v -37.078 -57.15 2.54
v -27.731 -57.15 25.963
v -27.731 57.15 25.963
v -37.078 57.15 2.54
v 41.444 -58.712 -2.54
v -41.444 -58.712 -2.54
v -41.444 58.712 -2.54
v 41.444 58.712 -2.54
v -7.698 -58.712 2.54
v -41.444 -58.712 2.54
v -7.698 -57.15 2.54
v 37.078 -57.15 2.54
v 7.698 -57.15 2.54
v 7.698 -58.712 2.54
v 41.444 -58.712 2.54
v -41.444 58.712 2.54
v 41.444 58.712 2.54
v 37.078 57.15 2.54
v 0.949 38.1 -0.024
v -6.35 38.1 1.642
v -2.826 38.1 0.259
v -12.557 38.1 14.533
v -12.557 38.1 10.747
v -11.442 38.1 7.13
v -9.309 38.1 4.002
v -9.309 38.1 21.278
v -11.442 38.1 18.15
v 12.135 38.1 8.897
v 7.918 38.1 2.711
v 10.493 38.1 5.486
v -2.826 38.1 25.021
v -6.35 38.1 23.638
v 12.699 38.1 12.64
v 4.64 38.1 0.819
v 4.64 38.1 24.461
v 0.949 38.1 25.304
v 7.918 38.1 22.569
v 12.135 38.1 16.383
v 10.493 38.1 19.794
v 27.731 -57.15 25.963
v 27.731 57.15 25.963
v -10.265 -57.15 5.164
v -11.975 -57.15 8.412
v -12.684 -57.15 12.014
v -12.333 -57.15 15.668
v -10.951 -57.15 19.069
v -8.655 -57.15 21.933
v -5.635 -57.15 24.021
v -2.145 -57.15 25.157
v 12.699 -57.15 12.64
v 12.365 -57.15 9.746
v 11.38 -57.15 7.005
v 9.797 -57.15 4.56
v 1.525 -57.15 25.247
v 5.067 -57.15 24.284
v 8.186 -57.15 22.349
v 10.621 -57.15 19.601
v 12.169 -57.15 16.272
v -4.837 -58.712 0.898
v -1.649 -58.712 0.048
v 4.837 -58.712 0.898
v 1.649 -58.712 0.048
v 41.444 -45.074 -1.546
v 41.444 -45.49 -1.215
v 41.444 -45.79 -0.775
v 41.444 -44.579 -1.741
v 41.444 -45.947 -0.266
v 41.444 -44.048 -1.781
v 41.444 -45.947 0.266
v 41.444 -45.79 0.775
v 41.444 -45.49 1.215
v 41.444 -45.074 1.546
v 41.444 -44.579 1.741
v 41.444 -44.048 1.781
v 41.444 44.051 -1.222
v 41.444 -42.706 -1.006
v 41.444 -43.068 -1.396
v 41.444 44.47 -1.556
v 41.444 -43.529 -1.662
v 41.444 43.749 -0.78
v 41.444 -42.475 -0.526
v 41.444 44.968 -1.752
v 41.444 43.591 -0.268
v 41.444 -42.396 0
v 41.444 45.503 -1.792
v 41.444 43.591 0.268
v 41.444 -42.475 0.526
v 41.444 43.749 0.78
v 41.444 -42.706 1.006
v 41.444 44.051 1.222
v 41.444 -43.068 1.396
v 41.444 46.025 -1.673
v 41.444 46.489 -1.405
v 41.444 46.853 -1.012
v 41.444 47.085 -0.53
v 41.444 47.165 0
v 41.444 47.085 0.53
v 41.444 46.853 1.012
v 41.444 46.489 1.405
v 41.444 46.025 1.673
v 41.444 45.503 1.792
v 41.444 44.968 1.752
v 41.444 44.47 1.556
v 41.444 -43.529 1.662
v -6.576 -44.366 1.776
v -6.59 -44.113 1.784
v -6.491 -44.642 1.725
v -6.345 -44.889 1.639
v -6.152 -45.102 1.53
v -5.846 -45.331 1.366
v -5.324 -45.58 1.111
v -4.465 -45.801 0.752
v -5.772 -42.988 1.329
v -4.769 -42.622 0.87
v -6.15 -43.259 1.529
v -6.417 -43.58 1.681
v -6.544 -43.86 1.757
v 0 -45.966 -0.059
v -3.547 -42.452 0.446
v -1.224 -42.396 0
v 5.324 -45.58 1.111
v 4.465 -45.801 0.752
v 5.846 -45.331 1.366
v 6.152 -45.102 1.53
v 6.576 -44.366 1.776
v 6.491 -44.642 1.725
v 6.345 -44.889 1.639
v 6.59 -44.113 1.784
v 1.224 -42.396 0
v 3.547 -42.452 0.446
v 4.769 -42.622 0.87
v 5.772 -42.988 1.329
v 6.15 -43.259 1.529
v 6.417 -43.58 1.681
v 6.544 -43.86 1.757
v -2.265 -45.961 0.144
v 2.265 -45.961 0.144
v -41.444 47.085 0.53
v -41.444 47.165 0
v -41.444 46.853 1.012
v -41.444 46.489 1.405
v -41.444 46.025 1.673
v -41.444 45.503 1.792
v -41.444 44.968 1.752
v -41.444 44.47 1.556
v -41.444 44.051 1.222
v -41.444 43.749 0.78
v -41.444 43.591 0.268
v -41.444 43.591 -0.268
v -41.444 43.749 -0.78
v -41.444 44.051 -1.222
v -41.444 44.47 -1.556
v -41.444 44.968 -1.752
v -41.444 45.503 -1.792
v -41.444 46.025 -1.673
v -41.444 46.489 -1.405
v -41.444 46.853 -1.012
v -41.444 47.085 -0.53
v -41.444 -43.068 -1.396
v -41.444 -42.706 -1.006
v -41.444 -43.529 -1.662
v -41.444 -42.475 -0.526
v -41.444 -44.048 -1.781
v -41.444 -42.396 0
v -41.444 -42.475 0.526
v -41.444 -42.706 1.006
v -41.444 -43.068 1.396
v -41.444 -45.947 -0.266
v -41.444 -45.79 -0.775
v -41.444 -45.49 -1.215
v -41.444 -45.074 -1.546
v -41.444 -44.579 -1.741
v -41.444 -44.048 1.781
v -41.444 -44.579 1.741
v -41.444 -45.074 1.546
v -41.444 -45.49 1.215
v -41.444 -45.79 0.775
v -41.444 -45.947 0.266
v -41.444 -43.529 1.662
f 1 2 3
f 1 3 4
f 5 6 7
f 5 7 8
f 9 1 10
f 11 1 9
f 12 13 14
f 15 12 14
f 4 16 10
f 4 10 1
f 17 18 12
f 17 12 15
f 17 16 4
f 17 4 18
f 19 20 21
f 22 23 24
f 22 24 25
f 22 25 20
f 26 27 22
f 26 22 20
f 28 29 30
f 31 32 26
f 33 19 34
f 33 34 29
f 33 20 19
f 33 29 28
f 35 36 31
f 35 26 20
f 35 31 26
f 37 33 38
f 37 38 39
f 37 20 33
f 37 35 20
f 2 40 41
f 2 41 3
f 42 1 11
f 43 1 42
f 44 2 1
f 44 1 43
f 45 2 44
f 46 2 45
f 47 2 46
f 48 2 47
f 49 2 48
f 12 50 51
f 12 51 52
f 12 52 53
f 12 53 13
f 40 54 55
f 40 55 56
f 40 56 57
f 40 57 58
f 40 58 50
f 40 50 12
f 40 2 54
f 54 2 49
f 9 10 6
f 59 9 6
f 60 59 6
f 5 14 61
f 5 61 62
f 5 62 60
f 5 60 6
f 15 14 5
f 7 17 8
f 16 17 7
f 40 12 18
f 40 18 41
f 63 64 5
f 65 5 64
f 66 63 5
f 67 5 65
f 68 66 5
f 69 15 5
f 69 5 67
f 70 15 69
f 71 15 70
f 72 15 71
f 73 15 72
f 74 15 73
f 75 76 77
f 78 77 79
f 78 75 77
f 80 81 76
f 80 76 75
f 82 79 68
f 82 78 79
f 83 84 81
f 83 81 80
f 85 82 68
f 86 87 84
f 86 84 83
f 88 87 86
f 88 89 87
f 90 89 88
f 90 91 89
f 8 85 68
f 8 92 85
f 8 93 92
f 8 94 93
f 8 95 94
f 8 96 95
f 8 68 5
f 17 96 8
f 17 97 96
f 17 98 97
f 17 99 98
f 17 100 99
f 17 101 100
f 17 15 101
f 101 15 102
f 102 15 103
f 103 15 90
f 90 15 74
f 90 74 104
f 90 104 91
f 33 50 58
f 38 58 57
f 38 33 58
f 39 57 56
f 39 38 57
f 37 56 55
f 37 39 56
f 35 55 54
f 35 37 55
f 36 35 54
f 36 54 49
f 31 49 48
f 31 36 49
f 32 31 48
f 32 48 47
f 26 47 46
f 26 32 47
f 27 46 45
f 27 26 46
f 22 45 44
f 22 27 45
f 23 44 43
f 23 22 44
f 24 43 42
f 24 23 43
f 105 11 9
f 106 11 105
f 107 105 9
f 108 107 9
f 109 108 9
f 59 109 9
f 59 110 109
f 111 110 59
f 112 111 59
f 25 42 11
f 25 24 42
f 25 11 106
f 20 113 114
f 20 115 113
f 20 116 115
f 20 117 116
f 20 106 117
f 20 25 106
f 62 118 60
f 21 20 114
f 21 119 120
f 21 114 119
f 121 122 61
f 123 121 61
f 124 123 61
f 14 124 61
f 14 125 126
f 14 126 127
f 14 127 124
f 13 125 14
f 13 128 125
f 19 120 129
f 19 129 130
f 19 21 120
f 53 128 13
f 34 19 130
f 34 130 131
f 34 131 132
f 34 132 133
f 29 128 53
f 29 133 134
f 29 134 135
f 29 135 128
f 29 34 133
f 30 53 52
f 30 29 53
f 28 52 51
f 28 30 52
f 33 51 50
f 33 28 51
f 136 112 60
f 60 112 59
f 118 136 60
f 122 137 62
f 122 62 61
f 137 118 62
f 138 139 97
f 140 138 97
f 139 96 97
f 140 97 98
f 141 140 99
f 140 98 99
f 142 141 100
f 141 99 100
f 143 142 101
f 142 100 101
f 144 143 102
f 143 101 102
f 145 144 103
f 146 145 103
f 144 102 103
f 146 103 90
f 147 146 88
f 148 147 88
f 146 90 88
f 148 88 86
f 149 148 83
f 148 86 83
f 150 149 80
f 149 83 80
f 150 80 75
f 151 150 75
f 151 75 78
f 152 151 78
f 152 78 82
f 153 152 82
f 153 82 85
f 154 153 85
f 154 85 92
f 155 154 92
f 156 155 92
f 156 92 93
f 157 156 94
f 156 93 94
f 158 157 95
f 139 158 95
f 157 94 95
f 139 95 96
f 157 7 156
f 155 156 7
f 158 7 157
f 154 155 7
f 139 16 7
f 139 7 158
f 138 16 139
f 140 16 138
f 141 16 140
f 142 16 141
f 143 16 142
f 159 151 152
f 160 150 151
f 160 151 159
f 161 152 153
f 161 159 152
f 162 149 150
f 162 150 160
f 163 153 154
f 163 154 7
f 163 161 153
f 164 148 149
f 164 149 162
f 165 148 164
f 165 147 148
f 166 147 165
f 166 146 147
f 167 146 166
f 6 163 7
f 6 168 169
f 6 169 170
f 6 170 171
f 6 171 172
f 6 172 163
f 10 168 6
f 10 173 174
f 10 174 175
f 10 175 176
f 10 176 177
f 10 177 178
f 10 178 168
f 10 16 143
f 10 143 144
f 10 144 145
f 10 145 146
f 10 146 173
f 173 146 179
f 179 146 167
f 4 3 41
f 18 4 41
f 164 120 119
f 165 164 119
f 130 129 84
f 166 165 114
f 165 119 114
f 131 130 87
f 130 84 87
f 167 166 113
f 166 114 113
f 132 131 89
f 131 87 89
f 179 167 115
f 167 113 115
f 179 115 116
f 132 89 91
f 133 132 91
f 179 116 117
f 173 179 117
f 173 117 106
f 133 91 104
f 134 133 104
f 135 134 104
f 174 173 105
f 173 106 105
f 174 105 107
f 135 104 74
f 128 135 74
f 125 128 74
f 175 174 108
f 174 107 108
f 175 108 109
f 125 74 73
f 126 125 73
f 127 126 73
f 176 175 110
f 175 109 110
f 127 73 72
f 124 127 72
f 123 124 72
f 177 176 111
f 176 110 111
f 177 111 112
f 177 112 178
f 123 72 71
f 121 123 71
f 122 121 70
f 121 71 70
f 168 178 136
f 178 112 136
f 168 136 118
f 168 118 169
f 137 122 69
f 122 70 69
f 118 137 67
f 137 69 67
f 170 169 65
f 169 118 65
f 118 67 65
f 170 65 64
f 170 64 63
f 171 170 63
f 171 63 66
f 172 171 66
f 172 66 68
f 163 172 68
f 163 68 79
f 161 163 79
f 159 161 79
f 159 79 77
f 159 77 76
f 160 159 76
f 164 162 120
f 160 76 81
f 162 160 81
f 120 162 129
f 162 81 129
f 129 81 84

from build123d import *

# Parameters (mm, degrees)
F1_DEPTH      = 57.15
F3_DEPTH      = 2.54
F4_R          = 12.699236
F5_DEPTH      = 98.806
F5_DEPTH_BACK = 38.1
F6_R          = 1.785731
F6_R_2        = 1.796868
F7_DEPTH      = 49.53


with BuildPart() as f1:
    # F0 (on Front) → F1 (new body, symmetric)
    with BuildSketch(Plane.XZ):
        Polygon((-38.091652, 0), (0, 0), (38.091652, 0), (27.730556, 25.96328), (0, 25.96328), (-27.730556, 25.96328), align=None)
    extrude(amount=F1_DEPTH, both=True)

    # F2 (on Top) → F3 (join, symmetric)
    with BuildSketch(Plane.XY):
        Polygon((-41.44403, 58.712374), (-41.44403, 0), (-41.44403, -58.712374), (0, -58.712374), (41.44403, -58.712374), (41.44403, 0), (41.44403, 58.712374), (0, 58.712374), align=None)
    extrude(amount=F3_DEPTH, both=True)

    # F4 (on Front) → F5 (cut, two sides)
    with BuildSketch(Plane.XZ) as f5_sk:
        with Locations((0, 12.640108)):
            Circle(F4_R)
    extrude(amount=F5_DEPTH, mode=Mode.SUBTRACT)
    extrude(f5_sk.sketch, amount=-F5_DEPTH_BACK, mode=Mode.SUBTRACT)

    # F6 (on Right) → F7 (cut, symmetric)
    with BuildSketch(Plane.YZ):
        with Locations((-44.18141, 0)):
            Circle(F6_R)
        with Locations((45.368254, 0)):
            Circle(F6_R_2)
    extrude(amount=F7_DEPTH, both=True, mode=Mode.SUBTRACT)


solid = f1.part
